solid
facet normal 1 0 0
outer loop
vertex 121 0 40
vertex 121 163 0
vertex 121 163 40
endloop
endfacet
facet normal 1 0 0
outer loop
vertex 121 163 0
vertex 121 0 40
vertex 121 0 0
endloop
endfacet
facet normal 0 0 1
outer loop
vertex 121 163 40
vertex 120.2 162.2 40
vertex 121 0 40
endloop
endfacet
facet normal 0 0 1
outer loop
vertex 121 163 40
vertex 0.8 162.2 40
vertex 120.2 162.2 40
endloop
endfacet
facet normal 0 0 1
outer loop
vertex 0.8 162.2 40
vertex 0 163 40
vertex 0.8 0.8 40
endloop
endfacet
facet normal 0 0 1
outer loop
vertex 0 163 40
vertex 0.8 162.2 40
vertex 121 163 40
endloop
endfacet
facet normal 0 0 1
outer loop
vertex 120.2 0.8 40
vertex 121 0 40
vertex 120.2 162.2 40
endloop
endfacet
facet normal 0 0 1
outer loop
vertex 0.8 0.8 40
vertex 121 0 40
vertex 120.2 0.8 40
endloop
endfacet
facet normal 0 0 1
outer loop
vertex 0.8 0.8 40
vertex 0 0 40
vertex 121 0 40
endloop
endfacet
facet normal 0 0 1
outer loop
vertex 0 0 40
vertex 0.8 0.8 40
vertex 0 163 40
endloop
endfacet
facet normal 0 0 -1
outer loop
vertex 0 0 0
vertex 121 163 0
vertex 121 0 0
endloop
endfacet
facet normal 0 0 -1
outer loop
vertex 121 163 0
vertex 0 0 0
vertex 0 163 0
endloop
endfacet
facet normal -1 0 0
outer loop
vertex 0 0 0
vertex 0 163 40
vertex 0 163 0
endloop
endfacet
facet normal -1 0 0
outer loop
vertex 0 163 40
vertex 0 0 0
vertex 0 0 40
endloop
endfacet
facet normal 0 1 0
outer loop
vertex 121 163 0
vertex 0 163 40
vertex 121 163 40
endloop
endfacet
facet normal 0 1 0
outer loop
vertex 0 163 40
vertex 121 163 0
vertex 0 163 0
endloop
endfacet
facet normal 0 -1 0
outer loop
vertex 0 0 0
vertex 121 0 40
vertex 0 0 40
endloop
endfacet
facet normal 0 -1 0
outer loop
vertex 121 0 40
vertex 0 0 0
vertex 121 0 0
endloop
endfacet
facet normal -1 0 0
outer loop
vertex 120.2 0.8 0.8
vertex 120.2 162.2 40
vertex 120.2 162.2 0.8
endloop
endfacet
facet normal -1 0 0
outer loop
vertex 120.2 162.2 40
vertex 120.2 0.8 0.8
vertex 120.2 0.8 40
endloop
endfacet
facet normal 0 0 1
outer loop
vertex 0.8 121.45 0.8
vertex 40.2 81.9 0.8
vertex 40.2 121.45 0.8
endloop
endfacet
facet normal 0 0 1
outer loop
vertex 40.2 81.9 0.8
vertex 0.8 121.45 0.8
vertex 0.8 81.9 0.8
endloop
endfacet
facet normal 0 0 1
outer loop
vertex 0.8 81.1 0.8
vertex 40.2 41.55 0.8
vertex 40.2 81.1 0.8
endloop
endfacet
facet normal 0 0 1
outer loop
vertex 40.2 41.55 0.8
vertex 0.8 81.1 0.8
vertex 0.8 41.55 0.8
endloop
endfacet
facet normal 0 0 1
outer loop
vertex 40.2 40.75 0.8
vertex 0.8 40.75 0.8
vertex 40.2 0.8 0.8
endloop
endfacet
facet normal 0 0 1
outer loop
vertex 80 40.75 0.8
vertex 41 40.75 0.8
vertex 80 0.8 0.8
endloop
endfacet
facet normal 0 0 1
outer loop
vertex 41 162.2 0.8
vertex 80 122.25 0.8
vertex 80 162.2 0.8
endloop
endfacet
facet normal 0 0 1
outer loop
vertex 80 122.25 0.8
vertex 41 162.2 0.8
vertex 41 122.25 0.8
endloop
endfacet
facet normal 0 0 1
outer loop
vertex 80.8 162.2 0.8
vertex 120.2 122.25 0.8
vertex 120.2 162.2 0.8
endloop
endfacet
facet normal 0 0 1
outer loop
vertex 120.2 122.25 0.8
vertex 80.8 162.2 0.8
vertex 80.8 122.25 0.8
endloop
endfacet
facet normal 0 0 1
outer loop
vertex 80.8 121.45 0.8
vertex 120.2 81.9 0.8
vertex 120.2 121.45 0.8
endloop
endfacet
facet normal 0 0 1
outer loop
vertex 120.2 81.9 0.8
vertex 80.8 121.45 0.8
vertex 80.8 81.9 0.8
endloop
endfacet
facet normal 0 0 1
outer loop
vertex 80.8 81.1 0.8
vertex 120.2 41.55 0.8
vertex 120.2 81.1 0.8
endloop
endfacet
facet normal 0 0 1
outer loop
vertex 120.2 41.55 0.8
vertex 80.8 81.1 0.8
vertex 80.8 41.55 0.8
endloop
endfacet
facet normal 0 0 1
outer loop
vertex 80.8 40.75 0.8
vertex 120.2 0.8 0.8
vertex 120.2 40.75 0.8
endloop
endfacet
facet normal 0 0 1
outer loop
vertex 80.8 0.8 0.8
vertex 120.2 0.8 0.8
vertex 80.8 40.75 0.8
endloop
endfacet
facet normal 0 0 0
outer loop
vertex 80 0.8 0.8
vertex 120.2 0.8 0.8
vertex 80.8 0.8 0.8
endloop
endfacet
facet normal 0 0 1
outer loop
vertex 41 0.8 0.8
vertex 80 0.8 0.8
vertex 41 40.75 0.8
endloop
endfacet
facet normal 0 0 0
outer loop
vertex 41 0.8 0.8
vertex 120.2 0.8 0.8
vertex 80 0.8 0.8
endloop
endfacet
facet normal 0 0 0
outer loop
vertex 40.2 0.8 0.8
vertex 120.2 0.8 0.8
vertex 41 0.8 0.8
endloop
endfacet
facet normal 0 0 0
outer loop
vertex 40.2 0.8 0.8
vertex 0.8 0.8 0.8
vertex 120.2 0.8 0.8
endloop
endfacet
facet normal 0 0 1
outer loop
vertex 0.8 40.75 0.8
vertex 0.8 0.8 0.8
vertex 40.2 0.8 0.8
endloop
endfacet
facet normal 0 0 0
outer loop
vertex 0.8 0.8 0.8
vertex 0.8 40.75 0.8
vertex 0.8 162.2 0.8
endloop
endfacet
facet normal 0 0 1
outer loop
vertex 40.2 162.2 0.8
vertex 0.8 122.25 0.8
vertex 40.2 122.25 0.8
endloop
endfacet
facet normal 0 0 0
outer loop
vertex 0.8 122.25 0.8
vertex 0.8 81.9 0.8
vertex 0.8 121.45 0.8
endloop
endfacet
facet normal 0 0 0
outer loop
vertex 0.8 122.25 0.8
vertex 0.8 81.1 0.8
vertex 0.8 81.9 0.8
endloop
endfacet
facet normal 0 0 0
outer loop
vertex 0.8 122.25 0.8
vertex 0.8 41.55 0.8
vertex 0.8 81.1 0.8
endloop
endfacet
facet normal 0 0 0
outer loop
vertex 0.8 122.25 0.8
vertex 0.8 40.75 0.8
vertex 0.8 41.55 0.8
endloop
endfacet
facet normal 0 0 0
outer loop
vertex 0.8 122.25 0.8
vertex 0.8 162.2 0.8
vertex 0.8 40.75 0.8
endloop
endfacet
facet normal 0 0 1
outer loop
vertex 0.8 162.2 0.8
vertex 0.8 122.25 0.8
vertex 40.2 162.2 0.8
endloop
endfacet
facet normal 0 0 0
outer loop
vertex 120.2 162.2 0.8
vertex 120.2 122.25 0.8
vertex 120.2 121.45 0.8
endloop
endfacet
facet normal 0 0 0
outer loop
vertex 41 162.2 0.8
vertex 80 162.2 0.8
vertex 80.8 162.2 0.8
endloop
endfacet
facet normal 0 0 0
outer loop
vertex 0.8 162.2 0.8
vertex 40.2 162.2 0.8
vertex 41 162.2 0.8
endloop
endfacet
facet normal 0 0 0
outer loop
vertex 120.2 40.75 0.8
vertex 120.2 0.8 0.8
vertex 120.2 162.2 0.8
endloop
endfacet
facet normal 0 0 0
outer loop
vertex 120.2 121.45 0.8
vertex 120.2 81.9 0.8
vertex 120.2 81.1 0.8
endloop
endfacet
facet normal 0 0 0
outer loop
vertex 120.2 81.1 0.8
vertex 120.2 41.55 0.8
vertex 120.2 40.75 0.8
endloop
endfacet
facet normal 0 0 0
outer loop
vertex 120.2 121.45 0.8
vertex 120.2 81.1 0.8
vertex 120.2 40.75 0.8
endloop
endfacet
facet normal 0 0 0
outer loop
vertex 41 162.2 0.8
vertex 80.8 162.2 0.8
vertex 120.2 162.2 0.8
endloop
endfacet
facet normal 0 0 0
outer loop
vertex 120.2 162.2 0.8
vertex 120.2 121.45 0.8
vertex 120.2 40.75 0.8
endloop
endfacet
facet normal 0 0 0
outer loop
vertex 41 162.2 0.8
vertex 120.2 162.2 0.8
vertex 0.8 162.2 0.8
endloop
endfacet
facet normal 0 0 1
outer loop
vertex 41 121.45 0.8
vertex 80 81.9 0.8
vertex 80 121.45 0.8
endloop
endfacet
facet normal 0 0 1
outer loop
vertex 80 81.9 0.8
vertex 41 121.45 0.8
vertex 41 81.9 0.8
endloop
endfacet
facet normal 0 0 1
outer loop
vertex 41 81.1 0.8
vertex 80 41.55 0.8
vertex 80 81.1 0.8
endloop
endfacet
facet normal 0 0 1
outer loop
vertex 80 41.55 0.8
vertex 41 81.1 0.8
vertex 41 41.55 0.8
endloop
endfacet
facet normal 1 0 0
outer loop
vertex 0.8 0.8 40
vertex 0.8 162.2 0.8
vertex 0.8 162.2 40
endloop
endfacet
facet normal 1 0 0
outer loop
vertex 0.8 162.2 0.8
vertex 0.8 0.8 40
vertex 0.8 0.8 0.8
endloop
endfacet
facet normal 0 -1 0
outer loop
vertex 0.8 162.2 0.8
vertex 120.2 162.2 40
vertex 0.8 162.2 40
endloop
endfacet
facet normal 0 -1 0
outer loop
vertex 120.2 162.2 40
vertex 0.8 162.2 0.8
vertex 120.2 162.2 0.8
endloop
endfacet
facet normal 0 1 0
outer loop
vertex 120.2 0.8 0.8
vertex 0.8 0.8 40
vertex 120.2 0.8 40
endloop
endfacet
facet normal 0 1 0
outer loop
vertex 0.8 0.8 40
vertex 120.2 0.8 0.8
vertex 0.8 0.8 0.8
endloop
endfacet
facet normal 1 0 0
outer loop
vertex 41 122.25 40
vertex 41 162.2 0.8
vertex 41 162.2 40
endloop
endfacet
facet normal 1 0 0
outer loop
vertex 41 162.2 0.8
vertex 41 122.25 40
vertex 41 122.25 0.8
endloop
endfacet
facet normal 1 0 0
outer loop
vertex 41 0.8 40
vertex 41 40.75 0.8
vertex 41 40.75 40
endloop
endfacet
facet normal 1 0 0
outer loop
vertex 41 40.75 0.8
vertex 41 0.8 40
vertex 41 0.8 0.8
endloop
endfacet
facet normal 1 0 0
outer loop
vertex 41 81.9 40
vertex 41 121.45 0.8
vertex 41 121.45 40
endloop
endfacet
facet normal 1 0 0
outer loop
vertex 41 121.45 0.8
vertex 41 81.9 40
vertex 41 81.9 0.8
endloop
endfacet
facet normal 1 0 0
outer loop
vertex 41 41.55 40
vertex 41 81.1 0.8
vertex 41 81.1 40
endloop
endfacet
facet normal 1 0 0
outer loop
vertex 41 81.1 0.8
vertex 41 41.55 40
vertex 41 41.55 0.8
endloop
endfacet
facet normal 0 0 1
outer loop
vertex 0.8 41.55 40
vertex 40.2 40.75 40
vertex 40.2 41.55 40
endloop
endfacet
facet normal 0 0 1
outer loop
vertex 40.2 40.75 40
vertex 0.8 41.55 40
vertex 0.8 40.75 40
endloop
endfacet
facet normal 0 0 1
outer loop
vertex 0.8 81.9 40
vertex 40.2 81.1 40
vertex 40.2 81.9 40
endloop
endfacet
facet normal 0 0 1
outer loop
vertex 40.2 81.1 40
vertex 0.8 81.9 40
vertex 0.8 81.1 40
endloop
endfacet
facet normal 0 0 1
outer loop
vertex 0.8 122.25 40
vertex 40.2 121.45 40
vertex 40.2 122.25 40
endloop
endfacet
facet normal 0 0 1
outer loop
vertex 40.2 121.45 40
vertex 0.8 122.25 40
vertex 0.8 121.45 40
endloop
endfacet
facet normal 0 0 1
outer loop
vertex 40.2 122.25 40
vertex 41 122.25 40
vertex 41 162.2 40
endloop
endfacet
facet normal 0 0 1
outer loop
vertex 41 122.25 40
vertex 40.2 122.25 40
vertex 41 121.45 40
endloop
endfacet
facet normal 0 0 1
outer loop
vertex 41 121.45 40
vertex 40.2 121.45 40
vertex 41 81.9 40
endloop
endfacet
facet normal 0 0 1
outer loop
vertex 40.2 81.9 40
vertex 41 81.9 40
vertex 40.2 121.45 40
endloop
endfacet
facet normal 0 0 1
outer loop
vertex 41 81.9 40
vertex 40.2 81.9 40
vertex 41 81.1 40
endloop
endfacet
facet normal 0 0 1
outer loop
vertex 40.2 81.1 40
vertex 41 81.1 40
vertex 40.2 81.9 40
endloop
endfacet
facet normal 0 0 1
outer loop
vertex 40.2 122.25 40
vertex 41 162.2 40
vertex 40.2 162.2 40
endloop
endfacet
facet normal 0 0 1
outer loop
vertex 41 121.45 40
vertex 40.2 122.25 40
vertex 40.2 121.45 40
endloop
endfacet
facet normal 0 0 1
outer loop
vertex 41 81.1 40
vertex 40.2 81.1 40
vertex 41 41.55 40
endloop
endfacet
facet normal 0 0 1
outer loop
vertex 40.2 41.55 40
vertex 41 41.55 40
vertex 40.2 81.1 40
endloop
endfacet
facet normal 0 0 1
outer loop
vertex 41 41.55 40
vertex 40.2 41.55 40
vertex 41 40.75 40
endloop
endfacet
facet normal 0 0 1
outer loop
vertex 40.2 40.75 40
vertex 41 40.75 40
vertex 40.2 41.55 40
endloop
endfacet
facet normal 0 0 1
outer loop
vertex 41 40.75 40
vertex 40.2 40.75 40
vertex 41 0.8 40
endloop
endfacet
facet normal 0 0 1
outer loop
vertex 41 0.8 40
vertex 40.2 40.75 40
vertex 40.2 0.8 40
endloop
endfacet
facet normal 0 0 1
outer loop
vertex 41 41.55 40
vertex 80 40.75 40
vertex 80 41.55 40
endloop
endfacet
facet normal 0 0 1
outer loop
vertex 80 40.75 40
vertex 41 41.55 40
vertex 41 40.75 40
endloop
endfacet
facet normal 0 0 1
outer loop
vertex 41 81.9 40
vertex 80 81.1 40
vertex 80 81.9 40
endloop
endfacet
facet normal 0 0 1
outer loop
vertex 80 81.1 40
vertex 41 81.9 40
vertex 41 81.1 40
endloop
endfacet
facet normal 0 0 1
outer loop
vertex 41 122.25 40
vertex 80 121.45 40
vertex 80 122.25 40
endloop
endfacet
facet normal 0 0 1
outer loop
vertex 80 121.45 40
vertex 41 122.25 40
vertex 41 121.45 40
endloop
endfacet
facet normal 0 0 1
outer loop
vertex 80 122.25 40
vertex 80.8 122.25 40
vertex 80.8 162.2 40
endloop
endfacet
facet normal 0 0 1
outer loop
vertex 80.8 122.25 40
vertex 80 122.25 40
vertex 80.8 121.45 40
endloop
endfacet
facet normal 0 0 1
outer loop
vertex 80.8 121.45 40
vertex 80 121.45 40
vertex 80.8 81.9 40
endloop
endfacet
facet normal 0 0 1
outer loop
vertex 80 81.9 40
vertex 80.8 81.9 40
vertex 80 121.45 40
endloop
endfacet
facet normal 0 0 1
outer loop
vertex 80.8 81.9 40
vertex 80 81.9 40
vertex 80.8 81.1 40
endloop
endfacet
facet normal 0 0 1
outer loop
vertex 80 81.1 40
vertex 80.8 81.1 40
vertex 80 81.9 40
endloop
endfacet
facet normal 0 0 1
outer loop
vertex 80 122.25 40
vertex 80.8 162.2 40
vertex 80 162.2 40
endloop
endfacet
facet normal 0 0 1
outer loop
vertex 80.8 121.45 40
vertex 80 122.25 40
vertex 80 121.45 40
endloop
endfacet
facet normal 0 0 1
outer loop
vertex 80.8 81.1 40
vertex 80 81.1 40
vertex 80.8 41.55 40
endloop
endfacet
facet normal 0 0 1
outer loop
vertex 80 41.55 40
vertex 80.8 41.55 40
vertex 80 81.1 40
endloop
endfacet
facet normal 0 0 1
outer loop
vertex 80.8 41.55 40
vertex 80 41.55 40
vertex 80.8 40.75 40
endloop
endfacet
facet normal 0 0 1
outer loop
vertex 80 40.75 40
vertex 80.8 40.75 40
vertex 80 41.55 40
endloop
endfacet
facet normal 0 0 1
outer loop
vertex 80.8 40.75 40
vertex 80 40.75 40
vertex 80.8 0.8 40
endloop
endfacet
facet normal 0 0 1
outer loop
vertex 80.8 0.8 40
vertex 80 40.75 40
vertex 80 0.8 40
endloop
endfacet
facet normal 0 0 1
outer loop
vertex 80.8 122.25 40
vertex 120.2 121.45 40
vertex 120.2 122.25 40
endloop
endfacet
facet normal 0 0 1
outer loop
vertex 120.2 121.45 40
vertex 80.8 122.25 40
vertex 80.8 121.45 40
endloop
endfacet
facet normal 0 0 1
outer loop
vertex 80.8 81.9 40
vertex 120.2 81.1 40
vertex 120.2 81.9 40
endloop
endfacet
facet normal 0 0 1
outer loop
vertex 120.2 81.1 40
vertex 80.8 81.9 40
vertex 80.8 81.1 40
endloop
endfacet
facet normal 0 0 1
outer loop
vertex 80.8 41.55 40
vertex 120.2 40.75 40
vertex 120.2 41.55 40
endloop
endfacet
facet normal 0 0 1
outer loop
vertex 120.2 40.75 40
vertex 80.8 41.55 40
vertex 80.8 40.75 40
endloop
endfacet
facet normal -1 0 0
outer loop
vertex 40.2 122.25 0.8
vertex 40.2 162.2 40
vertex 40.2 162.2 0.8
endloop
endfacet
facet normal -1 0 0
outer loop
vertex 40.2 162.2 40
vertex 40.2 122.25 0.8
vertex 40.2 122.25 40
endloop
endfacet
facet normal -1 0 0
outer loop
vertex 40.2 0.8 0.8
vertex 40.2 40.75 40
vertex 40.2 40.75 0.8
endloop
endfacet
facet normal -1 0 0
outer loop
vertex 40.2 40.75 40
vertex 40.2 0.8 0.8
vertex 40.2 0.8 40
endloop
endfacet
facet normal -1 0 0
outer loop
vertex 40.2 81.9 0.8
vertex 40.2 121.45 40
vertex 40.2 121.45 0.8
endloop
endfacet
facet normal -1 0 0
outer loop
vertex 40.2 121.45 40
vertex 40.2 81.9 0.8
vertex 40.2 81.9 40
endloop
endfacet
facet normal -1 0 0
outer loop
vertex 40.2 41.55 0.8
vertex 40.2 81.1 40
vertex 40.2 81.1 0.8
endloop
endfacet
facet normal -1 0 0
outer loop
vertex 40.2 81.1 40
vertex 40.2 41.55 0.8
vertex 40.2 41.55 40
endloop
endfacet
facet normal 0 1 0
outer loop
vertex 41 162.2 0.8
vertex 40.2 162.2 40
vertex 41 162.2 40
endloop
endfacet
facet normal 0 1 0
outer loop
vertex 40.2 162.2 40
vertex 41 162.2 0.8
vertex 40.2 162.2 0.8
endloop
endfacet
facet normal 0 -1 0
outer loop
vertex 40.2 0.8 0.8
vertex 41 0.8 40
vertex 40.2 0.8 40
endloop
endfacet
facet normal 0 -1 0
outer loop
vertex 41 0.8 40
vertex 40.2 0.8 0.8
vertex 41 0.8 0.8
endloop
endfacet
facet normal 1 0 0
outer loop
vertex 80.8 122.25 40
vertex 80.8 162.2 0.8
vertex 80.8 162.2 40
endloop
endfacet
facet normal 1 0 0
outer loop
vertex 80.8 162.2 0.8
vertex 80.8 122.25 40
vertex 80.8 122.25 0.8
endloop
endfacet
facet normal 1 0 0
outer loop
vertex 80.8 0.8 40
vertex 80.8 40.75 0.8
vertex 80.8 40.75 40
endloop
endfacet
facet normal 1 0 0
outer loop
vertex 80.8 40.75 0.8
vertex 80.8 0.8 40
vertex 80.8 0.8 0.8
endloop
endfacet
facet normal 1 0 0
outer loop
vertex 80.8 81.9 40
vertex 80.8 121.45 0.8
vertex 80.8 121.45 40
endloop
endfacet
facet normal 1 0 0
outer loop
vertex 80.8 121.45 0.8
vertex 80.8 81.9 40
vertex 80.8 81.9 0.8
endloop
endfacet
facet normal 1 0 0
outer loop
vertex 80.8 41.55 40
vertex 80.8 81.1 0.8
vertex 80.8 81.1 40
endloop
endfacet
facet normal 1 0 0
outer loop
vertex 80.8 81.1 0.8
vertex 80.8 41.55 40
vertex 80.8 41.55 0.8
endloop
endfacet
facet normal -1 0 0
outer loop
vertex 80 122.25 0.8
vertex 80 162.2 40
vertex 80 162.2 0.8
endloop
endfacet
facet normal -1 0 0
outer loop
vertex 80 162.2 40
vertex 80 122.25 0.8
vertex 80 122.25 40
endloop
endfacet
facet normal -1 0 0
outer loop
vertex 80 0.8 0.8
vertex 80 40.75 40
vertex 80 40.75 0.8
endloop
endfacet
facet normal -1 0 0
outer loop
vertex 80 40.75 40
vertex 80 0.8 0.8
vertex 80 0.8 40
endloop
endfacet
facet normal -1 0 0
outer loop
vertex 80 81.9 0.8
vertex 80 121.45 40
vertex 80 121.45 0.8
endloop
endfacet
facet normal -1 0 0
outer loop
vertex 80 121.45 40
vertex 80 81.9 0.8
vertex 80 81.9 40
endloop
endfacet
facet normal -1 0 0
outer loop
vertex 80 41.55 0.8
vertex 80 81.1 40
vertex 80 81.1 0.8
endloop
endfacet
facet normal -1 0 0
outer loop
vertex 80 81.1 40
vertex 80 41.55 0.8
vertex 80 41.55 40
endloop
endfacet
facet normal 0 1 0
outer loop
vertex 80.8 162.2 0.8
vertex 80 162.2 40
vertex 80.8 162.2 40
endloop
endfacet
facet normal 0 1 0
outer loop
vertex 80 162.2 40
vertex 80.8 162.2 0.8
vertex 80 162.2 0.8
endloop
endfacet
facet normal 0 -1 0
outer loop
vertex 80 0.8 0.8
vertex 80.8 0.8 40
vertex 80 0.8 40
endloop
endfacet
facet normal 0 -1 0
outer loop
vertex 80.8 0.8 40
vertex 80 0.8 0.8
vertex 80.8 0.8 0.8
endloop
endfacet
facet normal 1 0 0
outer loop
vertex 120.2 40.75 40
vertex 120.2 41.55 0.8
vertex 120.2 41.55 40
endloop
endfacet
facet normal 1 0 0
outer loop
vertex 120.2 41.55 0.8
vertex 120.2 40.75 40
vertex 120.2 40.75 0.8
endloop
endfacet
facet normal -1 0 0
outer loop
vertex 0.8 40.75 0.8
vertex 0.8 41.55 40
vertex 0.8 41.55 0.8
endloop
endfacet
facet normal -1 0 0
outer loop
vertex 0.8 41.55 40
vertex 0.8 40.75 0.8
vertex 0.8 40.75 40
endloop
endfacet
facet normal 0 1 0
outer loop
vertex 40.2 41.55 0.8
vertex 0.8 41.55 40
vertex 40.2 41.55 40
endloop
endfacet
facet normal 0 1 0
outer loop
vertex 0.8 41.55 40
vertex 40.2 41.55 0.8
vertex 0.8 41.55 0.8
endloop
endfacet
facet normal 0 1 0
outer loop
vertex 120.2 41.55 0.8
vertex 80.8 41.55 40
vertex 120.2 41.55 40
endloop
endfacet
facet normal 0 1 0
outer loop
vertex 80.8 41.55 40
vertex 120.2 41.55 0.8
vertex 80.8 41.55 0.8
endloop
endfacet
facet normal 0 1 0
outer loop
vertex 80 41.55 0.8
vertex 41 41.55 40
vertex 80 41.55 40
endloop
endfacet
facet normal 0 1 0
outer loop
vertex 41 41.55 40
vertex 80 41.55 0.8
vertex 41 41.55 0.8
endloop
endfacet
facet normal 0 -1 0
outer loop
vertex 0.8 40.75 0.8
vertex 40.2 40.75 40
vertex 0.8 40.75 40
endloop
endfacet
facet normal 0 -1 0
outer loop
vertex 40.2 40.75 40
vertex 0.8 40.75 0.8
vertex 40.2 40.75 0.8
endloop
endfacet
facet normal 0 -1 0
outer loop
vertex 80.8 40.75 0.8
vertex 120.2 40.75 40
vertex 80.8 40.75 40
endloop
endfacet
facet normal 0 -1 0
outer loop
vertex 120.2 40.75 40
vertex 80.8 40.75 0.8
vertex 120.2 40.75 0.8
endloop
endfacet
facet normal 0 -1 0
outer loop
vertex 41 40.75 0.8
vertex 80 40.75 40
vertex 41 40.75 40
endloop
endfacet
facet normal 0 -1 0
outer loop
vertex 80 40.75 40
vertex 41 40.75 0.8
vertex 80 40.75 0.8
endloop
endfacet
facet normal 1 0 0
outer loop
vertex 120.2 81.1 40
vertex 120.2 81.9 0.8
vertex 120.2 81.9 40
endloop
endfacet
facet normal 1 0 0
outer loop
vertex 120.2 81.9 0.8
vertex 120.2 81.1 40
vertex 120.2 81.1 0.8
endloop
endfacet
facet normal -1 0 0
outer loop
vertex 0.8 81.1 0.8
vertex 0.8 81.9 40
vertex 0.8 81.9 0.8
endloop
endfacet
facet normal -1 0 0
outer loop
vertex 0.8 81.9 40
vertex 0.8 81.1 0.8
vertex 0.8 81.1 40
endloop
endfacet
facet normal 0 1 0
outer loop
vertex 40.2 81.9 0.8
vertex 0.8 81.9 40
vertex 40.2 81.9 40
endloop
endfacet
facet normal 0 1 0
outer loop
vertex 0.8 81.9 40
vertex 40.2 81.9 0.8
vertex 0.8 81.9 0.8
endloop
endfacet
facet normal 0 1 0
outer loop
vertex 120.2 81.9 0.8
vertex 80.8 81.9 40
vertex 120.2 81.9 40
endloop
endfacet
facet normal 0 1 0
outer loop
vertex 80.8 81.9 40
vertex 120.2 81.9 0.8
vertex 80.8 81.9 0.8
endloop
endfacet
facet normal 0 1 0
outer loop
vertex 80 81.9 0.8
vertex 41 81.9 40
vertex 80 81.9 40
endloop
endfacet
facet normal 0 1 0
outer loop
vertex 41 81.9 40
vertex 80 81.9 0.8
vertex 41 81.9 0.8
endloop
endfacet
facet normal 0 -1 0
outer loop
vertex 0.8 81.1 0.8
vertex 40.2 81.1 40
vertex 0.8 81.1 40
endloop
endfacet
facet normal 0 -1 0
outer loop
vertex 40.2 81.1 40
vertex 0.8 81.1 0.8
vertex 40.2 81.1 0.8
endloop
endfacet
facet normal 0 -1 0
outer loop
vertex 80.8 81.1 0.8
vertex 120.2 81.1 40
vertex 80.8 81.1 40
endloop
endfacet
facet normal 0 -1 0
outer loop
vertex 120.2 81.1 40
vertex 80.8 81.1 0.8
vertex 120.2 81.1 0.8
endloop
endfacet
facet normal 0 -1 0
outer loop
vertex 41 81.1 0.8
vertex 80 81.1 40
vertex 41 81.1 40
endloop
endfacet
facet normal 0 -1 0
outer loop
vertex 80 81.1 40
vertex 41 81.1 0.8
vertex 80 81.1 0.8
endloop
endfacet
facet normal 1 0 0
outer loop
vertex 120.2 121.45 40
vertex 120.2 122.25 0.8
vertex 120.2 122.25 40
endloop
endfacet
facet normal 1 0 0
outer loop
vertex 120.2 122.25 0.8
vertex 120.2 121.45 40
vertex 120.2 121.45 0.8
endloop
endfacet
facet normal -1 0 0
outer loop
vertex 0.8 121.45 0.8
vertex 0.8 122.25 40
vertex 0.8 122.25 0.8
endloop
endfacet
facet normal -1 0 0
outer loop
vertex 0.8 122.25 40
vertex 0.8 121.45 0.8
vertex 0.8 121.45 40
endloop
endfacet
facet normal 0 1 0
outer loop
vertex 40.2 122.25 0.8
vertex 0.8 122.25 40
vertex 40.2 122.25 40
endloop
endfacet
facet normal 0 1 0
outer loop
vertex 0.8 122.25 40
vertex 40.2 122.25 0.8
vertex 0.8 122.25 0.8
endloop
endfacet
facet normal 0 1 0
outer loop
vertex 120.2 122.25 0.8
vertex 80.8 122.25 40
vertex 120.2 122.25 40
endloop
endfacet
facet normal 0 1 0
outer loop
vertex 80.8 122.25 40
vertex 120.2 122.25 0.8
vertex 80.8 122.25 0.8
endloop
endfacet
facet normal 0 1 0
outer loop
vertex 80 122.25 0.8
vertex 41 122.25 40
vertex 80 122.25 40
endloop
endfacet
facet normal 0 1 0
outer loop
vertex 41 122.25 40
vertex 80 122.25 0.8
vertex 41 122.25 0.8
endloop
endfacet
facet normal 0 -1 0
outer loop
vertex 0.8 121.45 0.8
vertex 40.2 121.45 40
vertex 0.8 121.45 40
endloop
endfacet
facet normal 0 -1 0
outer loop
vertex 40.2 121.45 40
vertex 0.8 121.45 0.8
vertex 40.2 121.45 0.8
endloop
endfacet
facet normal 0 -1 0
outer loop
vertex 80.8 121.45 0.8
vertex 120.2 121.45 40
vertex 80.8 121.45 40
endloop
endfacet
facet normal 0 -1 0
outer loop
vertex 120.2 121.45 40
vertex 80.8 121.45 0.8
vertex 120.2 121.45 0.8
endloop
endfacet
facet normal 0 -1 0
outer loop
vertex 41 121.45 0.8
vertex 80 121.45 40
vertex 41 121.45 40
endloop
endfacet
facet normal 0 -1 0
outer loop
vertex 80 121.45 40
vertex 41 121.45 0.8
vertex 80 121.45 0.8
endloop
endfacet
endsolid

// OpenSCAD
depth=163;
width=121;
height=40;
wall=.8;
inner_depth=163-wall*2;
inner_width=121-wall*2;
cols=3;
rows=4;
span_cols=[[0,1],[1,1],[2,1],[3,1],[4,1],[5,1]];
span_rows=[[0,0]];
//span_rows=[];
//span_cols=[];
col_width=inner_width/cols;
row_width=inner_depth/rows;
union() {
    difference() {
        cube([width,depth,height]);
        translate([wall,wall,wall]) cube([width-wall*2,depth-wall*2,height]);
    }
    translate([wall,wall,0]) {
        union() {
            for (i = [1:cols-1]) {
                translate([col_width*i-wall/2,0,0]) cube([wall,inner_depth,height]);
            }
            for (i = [1:rows-1]) {
                translate([0,row_width*i-wall/2,0]) cube([inner_width,wall,height]);
            }
        }
    }
}
